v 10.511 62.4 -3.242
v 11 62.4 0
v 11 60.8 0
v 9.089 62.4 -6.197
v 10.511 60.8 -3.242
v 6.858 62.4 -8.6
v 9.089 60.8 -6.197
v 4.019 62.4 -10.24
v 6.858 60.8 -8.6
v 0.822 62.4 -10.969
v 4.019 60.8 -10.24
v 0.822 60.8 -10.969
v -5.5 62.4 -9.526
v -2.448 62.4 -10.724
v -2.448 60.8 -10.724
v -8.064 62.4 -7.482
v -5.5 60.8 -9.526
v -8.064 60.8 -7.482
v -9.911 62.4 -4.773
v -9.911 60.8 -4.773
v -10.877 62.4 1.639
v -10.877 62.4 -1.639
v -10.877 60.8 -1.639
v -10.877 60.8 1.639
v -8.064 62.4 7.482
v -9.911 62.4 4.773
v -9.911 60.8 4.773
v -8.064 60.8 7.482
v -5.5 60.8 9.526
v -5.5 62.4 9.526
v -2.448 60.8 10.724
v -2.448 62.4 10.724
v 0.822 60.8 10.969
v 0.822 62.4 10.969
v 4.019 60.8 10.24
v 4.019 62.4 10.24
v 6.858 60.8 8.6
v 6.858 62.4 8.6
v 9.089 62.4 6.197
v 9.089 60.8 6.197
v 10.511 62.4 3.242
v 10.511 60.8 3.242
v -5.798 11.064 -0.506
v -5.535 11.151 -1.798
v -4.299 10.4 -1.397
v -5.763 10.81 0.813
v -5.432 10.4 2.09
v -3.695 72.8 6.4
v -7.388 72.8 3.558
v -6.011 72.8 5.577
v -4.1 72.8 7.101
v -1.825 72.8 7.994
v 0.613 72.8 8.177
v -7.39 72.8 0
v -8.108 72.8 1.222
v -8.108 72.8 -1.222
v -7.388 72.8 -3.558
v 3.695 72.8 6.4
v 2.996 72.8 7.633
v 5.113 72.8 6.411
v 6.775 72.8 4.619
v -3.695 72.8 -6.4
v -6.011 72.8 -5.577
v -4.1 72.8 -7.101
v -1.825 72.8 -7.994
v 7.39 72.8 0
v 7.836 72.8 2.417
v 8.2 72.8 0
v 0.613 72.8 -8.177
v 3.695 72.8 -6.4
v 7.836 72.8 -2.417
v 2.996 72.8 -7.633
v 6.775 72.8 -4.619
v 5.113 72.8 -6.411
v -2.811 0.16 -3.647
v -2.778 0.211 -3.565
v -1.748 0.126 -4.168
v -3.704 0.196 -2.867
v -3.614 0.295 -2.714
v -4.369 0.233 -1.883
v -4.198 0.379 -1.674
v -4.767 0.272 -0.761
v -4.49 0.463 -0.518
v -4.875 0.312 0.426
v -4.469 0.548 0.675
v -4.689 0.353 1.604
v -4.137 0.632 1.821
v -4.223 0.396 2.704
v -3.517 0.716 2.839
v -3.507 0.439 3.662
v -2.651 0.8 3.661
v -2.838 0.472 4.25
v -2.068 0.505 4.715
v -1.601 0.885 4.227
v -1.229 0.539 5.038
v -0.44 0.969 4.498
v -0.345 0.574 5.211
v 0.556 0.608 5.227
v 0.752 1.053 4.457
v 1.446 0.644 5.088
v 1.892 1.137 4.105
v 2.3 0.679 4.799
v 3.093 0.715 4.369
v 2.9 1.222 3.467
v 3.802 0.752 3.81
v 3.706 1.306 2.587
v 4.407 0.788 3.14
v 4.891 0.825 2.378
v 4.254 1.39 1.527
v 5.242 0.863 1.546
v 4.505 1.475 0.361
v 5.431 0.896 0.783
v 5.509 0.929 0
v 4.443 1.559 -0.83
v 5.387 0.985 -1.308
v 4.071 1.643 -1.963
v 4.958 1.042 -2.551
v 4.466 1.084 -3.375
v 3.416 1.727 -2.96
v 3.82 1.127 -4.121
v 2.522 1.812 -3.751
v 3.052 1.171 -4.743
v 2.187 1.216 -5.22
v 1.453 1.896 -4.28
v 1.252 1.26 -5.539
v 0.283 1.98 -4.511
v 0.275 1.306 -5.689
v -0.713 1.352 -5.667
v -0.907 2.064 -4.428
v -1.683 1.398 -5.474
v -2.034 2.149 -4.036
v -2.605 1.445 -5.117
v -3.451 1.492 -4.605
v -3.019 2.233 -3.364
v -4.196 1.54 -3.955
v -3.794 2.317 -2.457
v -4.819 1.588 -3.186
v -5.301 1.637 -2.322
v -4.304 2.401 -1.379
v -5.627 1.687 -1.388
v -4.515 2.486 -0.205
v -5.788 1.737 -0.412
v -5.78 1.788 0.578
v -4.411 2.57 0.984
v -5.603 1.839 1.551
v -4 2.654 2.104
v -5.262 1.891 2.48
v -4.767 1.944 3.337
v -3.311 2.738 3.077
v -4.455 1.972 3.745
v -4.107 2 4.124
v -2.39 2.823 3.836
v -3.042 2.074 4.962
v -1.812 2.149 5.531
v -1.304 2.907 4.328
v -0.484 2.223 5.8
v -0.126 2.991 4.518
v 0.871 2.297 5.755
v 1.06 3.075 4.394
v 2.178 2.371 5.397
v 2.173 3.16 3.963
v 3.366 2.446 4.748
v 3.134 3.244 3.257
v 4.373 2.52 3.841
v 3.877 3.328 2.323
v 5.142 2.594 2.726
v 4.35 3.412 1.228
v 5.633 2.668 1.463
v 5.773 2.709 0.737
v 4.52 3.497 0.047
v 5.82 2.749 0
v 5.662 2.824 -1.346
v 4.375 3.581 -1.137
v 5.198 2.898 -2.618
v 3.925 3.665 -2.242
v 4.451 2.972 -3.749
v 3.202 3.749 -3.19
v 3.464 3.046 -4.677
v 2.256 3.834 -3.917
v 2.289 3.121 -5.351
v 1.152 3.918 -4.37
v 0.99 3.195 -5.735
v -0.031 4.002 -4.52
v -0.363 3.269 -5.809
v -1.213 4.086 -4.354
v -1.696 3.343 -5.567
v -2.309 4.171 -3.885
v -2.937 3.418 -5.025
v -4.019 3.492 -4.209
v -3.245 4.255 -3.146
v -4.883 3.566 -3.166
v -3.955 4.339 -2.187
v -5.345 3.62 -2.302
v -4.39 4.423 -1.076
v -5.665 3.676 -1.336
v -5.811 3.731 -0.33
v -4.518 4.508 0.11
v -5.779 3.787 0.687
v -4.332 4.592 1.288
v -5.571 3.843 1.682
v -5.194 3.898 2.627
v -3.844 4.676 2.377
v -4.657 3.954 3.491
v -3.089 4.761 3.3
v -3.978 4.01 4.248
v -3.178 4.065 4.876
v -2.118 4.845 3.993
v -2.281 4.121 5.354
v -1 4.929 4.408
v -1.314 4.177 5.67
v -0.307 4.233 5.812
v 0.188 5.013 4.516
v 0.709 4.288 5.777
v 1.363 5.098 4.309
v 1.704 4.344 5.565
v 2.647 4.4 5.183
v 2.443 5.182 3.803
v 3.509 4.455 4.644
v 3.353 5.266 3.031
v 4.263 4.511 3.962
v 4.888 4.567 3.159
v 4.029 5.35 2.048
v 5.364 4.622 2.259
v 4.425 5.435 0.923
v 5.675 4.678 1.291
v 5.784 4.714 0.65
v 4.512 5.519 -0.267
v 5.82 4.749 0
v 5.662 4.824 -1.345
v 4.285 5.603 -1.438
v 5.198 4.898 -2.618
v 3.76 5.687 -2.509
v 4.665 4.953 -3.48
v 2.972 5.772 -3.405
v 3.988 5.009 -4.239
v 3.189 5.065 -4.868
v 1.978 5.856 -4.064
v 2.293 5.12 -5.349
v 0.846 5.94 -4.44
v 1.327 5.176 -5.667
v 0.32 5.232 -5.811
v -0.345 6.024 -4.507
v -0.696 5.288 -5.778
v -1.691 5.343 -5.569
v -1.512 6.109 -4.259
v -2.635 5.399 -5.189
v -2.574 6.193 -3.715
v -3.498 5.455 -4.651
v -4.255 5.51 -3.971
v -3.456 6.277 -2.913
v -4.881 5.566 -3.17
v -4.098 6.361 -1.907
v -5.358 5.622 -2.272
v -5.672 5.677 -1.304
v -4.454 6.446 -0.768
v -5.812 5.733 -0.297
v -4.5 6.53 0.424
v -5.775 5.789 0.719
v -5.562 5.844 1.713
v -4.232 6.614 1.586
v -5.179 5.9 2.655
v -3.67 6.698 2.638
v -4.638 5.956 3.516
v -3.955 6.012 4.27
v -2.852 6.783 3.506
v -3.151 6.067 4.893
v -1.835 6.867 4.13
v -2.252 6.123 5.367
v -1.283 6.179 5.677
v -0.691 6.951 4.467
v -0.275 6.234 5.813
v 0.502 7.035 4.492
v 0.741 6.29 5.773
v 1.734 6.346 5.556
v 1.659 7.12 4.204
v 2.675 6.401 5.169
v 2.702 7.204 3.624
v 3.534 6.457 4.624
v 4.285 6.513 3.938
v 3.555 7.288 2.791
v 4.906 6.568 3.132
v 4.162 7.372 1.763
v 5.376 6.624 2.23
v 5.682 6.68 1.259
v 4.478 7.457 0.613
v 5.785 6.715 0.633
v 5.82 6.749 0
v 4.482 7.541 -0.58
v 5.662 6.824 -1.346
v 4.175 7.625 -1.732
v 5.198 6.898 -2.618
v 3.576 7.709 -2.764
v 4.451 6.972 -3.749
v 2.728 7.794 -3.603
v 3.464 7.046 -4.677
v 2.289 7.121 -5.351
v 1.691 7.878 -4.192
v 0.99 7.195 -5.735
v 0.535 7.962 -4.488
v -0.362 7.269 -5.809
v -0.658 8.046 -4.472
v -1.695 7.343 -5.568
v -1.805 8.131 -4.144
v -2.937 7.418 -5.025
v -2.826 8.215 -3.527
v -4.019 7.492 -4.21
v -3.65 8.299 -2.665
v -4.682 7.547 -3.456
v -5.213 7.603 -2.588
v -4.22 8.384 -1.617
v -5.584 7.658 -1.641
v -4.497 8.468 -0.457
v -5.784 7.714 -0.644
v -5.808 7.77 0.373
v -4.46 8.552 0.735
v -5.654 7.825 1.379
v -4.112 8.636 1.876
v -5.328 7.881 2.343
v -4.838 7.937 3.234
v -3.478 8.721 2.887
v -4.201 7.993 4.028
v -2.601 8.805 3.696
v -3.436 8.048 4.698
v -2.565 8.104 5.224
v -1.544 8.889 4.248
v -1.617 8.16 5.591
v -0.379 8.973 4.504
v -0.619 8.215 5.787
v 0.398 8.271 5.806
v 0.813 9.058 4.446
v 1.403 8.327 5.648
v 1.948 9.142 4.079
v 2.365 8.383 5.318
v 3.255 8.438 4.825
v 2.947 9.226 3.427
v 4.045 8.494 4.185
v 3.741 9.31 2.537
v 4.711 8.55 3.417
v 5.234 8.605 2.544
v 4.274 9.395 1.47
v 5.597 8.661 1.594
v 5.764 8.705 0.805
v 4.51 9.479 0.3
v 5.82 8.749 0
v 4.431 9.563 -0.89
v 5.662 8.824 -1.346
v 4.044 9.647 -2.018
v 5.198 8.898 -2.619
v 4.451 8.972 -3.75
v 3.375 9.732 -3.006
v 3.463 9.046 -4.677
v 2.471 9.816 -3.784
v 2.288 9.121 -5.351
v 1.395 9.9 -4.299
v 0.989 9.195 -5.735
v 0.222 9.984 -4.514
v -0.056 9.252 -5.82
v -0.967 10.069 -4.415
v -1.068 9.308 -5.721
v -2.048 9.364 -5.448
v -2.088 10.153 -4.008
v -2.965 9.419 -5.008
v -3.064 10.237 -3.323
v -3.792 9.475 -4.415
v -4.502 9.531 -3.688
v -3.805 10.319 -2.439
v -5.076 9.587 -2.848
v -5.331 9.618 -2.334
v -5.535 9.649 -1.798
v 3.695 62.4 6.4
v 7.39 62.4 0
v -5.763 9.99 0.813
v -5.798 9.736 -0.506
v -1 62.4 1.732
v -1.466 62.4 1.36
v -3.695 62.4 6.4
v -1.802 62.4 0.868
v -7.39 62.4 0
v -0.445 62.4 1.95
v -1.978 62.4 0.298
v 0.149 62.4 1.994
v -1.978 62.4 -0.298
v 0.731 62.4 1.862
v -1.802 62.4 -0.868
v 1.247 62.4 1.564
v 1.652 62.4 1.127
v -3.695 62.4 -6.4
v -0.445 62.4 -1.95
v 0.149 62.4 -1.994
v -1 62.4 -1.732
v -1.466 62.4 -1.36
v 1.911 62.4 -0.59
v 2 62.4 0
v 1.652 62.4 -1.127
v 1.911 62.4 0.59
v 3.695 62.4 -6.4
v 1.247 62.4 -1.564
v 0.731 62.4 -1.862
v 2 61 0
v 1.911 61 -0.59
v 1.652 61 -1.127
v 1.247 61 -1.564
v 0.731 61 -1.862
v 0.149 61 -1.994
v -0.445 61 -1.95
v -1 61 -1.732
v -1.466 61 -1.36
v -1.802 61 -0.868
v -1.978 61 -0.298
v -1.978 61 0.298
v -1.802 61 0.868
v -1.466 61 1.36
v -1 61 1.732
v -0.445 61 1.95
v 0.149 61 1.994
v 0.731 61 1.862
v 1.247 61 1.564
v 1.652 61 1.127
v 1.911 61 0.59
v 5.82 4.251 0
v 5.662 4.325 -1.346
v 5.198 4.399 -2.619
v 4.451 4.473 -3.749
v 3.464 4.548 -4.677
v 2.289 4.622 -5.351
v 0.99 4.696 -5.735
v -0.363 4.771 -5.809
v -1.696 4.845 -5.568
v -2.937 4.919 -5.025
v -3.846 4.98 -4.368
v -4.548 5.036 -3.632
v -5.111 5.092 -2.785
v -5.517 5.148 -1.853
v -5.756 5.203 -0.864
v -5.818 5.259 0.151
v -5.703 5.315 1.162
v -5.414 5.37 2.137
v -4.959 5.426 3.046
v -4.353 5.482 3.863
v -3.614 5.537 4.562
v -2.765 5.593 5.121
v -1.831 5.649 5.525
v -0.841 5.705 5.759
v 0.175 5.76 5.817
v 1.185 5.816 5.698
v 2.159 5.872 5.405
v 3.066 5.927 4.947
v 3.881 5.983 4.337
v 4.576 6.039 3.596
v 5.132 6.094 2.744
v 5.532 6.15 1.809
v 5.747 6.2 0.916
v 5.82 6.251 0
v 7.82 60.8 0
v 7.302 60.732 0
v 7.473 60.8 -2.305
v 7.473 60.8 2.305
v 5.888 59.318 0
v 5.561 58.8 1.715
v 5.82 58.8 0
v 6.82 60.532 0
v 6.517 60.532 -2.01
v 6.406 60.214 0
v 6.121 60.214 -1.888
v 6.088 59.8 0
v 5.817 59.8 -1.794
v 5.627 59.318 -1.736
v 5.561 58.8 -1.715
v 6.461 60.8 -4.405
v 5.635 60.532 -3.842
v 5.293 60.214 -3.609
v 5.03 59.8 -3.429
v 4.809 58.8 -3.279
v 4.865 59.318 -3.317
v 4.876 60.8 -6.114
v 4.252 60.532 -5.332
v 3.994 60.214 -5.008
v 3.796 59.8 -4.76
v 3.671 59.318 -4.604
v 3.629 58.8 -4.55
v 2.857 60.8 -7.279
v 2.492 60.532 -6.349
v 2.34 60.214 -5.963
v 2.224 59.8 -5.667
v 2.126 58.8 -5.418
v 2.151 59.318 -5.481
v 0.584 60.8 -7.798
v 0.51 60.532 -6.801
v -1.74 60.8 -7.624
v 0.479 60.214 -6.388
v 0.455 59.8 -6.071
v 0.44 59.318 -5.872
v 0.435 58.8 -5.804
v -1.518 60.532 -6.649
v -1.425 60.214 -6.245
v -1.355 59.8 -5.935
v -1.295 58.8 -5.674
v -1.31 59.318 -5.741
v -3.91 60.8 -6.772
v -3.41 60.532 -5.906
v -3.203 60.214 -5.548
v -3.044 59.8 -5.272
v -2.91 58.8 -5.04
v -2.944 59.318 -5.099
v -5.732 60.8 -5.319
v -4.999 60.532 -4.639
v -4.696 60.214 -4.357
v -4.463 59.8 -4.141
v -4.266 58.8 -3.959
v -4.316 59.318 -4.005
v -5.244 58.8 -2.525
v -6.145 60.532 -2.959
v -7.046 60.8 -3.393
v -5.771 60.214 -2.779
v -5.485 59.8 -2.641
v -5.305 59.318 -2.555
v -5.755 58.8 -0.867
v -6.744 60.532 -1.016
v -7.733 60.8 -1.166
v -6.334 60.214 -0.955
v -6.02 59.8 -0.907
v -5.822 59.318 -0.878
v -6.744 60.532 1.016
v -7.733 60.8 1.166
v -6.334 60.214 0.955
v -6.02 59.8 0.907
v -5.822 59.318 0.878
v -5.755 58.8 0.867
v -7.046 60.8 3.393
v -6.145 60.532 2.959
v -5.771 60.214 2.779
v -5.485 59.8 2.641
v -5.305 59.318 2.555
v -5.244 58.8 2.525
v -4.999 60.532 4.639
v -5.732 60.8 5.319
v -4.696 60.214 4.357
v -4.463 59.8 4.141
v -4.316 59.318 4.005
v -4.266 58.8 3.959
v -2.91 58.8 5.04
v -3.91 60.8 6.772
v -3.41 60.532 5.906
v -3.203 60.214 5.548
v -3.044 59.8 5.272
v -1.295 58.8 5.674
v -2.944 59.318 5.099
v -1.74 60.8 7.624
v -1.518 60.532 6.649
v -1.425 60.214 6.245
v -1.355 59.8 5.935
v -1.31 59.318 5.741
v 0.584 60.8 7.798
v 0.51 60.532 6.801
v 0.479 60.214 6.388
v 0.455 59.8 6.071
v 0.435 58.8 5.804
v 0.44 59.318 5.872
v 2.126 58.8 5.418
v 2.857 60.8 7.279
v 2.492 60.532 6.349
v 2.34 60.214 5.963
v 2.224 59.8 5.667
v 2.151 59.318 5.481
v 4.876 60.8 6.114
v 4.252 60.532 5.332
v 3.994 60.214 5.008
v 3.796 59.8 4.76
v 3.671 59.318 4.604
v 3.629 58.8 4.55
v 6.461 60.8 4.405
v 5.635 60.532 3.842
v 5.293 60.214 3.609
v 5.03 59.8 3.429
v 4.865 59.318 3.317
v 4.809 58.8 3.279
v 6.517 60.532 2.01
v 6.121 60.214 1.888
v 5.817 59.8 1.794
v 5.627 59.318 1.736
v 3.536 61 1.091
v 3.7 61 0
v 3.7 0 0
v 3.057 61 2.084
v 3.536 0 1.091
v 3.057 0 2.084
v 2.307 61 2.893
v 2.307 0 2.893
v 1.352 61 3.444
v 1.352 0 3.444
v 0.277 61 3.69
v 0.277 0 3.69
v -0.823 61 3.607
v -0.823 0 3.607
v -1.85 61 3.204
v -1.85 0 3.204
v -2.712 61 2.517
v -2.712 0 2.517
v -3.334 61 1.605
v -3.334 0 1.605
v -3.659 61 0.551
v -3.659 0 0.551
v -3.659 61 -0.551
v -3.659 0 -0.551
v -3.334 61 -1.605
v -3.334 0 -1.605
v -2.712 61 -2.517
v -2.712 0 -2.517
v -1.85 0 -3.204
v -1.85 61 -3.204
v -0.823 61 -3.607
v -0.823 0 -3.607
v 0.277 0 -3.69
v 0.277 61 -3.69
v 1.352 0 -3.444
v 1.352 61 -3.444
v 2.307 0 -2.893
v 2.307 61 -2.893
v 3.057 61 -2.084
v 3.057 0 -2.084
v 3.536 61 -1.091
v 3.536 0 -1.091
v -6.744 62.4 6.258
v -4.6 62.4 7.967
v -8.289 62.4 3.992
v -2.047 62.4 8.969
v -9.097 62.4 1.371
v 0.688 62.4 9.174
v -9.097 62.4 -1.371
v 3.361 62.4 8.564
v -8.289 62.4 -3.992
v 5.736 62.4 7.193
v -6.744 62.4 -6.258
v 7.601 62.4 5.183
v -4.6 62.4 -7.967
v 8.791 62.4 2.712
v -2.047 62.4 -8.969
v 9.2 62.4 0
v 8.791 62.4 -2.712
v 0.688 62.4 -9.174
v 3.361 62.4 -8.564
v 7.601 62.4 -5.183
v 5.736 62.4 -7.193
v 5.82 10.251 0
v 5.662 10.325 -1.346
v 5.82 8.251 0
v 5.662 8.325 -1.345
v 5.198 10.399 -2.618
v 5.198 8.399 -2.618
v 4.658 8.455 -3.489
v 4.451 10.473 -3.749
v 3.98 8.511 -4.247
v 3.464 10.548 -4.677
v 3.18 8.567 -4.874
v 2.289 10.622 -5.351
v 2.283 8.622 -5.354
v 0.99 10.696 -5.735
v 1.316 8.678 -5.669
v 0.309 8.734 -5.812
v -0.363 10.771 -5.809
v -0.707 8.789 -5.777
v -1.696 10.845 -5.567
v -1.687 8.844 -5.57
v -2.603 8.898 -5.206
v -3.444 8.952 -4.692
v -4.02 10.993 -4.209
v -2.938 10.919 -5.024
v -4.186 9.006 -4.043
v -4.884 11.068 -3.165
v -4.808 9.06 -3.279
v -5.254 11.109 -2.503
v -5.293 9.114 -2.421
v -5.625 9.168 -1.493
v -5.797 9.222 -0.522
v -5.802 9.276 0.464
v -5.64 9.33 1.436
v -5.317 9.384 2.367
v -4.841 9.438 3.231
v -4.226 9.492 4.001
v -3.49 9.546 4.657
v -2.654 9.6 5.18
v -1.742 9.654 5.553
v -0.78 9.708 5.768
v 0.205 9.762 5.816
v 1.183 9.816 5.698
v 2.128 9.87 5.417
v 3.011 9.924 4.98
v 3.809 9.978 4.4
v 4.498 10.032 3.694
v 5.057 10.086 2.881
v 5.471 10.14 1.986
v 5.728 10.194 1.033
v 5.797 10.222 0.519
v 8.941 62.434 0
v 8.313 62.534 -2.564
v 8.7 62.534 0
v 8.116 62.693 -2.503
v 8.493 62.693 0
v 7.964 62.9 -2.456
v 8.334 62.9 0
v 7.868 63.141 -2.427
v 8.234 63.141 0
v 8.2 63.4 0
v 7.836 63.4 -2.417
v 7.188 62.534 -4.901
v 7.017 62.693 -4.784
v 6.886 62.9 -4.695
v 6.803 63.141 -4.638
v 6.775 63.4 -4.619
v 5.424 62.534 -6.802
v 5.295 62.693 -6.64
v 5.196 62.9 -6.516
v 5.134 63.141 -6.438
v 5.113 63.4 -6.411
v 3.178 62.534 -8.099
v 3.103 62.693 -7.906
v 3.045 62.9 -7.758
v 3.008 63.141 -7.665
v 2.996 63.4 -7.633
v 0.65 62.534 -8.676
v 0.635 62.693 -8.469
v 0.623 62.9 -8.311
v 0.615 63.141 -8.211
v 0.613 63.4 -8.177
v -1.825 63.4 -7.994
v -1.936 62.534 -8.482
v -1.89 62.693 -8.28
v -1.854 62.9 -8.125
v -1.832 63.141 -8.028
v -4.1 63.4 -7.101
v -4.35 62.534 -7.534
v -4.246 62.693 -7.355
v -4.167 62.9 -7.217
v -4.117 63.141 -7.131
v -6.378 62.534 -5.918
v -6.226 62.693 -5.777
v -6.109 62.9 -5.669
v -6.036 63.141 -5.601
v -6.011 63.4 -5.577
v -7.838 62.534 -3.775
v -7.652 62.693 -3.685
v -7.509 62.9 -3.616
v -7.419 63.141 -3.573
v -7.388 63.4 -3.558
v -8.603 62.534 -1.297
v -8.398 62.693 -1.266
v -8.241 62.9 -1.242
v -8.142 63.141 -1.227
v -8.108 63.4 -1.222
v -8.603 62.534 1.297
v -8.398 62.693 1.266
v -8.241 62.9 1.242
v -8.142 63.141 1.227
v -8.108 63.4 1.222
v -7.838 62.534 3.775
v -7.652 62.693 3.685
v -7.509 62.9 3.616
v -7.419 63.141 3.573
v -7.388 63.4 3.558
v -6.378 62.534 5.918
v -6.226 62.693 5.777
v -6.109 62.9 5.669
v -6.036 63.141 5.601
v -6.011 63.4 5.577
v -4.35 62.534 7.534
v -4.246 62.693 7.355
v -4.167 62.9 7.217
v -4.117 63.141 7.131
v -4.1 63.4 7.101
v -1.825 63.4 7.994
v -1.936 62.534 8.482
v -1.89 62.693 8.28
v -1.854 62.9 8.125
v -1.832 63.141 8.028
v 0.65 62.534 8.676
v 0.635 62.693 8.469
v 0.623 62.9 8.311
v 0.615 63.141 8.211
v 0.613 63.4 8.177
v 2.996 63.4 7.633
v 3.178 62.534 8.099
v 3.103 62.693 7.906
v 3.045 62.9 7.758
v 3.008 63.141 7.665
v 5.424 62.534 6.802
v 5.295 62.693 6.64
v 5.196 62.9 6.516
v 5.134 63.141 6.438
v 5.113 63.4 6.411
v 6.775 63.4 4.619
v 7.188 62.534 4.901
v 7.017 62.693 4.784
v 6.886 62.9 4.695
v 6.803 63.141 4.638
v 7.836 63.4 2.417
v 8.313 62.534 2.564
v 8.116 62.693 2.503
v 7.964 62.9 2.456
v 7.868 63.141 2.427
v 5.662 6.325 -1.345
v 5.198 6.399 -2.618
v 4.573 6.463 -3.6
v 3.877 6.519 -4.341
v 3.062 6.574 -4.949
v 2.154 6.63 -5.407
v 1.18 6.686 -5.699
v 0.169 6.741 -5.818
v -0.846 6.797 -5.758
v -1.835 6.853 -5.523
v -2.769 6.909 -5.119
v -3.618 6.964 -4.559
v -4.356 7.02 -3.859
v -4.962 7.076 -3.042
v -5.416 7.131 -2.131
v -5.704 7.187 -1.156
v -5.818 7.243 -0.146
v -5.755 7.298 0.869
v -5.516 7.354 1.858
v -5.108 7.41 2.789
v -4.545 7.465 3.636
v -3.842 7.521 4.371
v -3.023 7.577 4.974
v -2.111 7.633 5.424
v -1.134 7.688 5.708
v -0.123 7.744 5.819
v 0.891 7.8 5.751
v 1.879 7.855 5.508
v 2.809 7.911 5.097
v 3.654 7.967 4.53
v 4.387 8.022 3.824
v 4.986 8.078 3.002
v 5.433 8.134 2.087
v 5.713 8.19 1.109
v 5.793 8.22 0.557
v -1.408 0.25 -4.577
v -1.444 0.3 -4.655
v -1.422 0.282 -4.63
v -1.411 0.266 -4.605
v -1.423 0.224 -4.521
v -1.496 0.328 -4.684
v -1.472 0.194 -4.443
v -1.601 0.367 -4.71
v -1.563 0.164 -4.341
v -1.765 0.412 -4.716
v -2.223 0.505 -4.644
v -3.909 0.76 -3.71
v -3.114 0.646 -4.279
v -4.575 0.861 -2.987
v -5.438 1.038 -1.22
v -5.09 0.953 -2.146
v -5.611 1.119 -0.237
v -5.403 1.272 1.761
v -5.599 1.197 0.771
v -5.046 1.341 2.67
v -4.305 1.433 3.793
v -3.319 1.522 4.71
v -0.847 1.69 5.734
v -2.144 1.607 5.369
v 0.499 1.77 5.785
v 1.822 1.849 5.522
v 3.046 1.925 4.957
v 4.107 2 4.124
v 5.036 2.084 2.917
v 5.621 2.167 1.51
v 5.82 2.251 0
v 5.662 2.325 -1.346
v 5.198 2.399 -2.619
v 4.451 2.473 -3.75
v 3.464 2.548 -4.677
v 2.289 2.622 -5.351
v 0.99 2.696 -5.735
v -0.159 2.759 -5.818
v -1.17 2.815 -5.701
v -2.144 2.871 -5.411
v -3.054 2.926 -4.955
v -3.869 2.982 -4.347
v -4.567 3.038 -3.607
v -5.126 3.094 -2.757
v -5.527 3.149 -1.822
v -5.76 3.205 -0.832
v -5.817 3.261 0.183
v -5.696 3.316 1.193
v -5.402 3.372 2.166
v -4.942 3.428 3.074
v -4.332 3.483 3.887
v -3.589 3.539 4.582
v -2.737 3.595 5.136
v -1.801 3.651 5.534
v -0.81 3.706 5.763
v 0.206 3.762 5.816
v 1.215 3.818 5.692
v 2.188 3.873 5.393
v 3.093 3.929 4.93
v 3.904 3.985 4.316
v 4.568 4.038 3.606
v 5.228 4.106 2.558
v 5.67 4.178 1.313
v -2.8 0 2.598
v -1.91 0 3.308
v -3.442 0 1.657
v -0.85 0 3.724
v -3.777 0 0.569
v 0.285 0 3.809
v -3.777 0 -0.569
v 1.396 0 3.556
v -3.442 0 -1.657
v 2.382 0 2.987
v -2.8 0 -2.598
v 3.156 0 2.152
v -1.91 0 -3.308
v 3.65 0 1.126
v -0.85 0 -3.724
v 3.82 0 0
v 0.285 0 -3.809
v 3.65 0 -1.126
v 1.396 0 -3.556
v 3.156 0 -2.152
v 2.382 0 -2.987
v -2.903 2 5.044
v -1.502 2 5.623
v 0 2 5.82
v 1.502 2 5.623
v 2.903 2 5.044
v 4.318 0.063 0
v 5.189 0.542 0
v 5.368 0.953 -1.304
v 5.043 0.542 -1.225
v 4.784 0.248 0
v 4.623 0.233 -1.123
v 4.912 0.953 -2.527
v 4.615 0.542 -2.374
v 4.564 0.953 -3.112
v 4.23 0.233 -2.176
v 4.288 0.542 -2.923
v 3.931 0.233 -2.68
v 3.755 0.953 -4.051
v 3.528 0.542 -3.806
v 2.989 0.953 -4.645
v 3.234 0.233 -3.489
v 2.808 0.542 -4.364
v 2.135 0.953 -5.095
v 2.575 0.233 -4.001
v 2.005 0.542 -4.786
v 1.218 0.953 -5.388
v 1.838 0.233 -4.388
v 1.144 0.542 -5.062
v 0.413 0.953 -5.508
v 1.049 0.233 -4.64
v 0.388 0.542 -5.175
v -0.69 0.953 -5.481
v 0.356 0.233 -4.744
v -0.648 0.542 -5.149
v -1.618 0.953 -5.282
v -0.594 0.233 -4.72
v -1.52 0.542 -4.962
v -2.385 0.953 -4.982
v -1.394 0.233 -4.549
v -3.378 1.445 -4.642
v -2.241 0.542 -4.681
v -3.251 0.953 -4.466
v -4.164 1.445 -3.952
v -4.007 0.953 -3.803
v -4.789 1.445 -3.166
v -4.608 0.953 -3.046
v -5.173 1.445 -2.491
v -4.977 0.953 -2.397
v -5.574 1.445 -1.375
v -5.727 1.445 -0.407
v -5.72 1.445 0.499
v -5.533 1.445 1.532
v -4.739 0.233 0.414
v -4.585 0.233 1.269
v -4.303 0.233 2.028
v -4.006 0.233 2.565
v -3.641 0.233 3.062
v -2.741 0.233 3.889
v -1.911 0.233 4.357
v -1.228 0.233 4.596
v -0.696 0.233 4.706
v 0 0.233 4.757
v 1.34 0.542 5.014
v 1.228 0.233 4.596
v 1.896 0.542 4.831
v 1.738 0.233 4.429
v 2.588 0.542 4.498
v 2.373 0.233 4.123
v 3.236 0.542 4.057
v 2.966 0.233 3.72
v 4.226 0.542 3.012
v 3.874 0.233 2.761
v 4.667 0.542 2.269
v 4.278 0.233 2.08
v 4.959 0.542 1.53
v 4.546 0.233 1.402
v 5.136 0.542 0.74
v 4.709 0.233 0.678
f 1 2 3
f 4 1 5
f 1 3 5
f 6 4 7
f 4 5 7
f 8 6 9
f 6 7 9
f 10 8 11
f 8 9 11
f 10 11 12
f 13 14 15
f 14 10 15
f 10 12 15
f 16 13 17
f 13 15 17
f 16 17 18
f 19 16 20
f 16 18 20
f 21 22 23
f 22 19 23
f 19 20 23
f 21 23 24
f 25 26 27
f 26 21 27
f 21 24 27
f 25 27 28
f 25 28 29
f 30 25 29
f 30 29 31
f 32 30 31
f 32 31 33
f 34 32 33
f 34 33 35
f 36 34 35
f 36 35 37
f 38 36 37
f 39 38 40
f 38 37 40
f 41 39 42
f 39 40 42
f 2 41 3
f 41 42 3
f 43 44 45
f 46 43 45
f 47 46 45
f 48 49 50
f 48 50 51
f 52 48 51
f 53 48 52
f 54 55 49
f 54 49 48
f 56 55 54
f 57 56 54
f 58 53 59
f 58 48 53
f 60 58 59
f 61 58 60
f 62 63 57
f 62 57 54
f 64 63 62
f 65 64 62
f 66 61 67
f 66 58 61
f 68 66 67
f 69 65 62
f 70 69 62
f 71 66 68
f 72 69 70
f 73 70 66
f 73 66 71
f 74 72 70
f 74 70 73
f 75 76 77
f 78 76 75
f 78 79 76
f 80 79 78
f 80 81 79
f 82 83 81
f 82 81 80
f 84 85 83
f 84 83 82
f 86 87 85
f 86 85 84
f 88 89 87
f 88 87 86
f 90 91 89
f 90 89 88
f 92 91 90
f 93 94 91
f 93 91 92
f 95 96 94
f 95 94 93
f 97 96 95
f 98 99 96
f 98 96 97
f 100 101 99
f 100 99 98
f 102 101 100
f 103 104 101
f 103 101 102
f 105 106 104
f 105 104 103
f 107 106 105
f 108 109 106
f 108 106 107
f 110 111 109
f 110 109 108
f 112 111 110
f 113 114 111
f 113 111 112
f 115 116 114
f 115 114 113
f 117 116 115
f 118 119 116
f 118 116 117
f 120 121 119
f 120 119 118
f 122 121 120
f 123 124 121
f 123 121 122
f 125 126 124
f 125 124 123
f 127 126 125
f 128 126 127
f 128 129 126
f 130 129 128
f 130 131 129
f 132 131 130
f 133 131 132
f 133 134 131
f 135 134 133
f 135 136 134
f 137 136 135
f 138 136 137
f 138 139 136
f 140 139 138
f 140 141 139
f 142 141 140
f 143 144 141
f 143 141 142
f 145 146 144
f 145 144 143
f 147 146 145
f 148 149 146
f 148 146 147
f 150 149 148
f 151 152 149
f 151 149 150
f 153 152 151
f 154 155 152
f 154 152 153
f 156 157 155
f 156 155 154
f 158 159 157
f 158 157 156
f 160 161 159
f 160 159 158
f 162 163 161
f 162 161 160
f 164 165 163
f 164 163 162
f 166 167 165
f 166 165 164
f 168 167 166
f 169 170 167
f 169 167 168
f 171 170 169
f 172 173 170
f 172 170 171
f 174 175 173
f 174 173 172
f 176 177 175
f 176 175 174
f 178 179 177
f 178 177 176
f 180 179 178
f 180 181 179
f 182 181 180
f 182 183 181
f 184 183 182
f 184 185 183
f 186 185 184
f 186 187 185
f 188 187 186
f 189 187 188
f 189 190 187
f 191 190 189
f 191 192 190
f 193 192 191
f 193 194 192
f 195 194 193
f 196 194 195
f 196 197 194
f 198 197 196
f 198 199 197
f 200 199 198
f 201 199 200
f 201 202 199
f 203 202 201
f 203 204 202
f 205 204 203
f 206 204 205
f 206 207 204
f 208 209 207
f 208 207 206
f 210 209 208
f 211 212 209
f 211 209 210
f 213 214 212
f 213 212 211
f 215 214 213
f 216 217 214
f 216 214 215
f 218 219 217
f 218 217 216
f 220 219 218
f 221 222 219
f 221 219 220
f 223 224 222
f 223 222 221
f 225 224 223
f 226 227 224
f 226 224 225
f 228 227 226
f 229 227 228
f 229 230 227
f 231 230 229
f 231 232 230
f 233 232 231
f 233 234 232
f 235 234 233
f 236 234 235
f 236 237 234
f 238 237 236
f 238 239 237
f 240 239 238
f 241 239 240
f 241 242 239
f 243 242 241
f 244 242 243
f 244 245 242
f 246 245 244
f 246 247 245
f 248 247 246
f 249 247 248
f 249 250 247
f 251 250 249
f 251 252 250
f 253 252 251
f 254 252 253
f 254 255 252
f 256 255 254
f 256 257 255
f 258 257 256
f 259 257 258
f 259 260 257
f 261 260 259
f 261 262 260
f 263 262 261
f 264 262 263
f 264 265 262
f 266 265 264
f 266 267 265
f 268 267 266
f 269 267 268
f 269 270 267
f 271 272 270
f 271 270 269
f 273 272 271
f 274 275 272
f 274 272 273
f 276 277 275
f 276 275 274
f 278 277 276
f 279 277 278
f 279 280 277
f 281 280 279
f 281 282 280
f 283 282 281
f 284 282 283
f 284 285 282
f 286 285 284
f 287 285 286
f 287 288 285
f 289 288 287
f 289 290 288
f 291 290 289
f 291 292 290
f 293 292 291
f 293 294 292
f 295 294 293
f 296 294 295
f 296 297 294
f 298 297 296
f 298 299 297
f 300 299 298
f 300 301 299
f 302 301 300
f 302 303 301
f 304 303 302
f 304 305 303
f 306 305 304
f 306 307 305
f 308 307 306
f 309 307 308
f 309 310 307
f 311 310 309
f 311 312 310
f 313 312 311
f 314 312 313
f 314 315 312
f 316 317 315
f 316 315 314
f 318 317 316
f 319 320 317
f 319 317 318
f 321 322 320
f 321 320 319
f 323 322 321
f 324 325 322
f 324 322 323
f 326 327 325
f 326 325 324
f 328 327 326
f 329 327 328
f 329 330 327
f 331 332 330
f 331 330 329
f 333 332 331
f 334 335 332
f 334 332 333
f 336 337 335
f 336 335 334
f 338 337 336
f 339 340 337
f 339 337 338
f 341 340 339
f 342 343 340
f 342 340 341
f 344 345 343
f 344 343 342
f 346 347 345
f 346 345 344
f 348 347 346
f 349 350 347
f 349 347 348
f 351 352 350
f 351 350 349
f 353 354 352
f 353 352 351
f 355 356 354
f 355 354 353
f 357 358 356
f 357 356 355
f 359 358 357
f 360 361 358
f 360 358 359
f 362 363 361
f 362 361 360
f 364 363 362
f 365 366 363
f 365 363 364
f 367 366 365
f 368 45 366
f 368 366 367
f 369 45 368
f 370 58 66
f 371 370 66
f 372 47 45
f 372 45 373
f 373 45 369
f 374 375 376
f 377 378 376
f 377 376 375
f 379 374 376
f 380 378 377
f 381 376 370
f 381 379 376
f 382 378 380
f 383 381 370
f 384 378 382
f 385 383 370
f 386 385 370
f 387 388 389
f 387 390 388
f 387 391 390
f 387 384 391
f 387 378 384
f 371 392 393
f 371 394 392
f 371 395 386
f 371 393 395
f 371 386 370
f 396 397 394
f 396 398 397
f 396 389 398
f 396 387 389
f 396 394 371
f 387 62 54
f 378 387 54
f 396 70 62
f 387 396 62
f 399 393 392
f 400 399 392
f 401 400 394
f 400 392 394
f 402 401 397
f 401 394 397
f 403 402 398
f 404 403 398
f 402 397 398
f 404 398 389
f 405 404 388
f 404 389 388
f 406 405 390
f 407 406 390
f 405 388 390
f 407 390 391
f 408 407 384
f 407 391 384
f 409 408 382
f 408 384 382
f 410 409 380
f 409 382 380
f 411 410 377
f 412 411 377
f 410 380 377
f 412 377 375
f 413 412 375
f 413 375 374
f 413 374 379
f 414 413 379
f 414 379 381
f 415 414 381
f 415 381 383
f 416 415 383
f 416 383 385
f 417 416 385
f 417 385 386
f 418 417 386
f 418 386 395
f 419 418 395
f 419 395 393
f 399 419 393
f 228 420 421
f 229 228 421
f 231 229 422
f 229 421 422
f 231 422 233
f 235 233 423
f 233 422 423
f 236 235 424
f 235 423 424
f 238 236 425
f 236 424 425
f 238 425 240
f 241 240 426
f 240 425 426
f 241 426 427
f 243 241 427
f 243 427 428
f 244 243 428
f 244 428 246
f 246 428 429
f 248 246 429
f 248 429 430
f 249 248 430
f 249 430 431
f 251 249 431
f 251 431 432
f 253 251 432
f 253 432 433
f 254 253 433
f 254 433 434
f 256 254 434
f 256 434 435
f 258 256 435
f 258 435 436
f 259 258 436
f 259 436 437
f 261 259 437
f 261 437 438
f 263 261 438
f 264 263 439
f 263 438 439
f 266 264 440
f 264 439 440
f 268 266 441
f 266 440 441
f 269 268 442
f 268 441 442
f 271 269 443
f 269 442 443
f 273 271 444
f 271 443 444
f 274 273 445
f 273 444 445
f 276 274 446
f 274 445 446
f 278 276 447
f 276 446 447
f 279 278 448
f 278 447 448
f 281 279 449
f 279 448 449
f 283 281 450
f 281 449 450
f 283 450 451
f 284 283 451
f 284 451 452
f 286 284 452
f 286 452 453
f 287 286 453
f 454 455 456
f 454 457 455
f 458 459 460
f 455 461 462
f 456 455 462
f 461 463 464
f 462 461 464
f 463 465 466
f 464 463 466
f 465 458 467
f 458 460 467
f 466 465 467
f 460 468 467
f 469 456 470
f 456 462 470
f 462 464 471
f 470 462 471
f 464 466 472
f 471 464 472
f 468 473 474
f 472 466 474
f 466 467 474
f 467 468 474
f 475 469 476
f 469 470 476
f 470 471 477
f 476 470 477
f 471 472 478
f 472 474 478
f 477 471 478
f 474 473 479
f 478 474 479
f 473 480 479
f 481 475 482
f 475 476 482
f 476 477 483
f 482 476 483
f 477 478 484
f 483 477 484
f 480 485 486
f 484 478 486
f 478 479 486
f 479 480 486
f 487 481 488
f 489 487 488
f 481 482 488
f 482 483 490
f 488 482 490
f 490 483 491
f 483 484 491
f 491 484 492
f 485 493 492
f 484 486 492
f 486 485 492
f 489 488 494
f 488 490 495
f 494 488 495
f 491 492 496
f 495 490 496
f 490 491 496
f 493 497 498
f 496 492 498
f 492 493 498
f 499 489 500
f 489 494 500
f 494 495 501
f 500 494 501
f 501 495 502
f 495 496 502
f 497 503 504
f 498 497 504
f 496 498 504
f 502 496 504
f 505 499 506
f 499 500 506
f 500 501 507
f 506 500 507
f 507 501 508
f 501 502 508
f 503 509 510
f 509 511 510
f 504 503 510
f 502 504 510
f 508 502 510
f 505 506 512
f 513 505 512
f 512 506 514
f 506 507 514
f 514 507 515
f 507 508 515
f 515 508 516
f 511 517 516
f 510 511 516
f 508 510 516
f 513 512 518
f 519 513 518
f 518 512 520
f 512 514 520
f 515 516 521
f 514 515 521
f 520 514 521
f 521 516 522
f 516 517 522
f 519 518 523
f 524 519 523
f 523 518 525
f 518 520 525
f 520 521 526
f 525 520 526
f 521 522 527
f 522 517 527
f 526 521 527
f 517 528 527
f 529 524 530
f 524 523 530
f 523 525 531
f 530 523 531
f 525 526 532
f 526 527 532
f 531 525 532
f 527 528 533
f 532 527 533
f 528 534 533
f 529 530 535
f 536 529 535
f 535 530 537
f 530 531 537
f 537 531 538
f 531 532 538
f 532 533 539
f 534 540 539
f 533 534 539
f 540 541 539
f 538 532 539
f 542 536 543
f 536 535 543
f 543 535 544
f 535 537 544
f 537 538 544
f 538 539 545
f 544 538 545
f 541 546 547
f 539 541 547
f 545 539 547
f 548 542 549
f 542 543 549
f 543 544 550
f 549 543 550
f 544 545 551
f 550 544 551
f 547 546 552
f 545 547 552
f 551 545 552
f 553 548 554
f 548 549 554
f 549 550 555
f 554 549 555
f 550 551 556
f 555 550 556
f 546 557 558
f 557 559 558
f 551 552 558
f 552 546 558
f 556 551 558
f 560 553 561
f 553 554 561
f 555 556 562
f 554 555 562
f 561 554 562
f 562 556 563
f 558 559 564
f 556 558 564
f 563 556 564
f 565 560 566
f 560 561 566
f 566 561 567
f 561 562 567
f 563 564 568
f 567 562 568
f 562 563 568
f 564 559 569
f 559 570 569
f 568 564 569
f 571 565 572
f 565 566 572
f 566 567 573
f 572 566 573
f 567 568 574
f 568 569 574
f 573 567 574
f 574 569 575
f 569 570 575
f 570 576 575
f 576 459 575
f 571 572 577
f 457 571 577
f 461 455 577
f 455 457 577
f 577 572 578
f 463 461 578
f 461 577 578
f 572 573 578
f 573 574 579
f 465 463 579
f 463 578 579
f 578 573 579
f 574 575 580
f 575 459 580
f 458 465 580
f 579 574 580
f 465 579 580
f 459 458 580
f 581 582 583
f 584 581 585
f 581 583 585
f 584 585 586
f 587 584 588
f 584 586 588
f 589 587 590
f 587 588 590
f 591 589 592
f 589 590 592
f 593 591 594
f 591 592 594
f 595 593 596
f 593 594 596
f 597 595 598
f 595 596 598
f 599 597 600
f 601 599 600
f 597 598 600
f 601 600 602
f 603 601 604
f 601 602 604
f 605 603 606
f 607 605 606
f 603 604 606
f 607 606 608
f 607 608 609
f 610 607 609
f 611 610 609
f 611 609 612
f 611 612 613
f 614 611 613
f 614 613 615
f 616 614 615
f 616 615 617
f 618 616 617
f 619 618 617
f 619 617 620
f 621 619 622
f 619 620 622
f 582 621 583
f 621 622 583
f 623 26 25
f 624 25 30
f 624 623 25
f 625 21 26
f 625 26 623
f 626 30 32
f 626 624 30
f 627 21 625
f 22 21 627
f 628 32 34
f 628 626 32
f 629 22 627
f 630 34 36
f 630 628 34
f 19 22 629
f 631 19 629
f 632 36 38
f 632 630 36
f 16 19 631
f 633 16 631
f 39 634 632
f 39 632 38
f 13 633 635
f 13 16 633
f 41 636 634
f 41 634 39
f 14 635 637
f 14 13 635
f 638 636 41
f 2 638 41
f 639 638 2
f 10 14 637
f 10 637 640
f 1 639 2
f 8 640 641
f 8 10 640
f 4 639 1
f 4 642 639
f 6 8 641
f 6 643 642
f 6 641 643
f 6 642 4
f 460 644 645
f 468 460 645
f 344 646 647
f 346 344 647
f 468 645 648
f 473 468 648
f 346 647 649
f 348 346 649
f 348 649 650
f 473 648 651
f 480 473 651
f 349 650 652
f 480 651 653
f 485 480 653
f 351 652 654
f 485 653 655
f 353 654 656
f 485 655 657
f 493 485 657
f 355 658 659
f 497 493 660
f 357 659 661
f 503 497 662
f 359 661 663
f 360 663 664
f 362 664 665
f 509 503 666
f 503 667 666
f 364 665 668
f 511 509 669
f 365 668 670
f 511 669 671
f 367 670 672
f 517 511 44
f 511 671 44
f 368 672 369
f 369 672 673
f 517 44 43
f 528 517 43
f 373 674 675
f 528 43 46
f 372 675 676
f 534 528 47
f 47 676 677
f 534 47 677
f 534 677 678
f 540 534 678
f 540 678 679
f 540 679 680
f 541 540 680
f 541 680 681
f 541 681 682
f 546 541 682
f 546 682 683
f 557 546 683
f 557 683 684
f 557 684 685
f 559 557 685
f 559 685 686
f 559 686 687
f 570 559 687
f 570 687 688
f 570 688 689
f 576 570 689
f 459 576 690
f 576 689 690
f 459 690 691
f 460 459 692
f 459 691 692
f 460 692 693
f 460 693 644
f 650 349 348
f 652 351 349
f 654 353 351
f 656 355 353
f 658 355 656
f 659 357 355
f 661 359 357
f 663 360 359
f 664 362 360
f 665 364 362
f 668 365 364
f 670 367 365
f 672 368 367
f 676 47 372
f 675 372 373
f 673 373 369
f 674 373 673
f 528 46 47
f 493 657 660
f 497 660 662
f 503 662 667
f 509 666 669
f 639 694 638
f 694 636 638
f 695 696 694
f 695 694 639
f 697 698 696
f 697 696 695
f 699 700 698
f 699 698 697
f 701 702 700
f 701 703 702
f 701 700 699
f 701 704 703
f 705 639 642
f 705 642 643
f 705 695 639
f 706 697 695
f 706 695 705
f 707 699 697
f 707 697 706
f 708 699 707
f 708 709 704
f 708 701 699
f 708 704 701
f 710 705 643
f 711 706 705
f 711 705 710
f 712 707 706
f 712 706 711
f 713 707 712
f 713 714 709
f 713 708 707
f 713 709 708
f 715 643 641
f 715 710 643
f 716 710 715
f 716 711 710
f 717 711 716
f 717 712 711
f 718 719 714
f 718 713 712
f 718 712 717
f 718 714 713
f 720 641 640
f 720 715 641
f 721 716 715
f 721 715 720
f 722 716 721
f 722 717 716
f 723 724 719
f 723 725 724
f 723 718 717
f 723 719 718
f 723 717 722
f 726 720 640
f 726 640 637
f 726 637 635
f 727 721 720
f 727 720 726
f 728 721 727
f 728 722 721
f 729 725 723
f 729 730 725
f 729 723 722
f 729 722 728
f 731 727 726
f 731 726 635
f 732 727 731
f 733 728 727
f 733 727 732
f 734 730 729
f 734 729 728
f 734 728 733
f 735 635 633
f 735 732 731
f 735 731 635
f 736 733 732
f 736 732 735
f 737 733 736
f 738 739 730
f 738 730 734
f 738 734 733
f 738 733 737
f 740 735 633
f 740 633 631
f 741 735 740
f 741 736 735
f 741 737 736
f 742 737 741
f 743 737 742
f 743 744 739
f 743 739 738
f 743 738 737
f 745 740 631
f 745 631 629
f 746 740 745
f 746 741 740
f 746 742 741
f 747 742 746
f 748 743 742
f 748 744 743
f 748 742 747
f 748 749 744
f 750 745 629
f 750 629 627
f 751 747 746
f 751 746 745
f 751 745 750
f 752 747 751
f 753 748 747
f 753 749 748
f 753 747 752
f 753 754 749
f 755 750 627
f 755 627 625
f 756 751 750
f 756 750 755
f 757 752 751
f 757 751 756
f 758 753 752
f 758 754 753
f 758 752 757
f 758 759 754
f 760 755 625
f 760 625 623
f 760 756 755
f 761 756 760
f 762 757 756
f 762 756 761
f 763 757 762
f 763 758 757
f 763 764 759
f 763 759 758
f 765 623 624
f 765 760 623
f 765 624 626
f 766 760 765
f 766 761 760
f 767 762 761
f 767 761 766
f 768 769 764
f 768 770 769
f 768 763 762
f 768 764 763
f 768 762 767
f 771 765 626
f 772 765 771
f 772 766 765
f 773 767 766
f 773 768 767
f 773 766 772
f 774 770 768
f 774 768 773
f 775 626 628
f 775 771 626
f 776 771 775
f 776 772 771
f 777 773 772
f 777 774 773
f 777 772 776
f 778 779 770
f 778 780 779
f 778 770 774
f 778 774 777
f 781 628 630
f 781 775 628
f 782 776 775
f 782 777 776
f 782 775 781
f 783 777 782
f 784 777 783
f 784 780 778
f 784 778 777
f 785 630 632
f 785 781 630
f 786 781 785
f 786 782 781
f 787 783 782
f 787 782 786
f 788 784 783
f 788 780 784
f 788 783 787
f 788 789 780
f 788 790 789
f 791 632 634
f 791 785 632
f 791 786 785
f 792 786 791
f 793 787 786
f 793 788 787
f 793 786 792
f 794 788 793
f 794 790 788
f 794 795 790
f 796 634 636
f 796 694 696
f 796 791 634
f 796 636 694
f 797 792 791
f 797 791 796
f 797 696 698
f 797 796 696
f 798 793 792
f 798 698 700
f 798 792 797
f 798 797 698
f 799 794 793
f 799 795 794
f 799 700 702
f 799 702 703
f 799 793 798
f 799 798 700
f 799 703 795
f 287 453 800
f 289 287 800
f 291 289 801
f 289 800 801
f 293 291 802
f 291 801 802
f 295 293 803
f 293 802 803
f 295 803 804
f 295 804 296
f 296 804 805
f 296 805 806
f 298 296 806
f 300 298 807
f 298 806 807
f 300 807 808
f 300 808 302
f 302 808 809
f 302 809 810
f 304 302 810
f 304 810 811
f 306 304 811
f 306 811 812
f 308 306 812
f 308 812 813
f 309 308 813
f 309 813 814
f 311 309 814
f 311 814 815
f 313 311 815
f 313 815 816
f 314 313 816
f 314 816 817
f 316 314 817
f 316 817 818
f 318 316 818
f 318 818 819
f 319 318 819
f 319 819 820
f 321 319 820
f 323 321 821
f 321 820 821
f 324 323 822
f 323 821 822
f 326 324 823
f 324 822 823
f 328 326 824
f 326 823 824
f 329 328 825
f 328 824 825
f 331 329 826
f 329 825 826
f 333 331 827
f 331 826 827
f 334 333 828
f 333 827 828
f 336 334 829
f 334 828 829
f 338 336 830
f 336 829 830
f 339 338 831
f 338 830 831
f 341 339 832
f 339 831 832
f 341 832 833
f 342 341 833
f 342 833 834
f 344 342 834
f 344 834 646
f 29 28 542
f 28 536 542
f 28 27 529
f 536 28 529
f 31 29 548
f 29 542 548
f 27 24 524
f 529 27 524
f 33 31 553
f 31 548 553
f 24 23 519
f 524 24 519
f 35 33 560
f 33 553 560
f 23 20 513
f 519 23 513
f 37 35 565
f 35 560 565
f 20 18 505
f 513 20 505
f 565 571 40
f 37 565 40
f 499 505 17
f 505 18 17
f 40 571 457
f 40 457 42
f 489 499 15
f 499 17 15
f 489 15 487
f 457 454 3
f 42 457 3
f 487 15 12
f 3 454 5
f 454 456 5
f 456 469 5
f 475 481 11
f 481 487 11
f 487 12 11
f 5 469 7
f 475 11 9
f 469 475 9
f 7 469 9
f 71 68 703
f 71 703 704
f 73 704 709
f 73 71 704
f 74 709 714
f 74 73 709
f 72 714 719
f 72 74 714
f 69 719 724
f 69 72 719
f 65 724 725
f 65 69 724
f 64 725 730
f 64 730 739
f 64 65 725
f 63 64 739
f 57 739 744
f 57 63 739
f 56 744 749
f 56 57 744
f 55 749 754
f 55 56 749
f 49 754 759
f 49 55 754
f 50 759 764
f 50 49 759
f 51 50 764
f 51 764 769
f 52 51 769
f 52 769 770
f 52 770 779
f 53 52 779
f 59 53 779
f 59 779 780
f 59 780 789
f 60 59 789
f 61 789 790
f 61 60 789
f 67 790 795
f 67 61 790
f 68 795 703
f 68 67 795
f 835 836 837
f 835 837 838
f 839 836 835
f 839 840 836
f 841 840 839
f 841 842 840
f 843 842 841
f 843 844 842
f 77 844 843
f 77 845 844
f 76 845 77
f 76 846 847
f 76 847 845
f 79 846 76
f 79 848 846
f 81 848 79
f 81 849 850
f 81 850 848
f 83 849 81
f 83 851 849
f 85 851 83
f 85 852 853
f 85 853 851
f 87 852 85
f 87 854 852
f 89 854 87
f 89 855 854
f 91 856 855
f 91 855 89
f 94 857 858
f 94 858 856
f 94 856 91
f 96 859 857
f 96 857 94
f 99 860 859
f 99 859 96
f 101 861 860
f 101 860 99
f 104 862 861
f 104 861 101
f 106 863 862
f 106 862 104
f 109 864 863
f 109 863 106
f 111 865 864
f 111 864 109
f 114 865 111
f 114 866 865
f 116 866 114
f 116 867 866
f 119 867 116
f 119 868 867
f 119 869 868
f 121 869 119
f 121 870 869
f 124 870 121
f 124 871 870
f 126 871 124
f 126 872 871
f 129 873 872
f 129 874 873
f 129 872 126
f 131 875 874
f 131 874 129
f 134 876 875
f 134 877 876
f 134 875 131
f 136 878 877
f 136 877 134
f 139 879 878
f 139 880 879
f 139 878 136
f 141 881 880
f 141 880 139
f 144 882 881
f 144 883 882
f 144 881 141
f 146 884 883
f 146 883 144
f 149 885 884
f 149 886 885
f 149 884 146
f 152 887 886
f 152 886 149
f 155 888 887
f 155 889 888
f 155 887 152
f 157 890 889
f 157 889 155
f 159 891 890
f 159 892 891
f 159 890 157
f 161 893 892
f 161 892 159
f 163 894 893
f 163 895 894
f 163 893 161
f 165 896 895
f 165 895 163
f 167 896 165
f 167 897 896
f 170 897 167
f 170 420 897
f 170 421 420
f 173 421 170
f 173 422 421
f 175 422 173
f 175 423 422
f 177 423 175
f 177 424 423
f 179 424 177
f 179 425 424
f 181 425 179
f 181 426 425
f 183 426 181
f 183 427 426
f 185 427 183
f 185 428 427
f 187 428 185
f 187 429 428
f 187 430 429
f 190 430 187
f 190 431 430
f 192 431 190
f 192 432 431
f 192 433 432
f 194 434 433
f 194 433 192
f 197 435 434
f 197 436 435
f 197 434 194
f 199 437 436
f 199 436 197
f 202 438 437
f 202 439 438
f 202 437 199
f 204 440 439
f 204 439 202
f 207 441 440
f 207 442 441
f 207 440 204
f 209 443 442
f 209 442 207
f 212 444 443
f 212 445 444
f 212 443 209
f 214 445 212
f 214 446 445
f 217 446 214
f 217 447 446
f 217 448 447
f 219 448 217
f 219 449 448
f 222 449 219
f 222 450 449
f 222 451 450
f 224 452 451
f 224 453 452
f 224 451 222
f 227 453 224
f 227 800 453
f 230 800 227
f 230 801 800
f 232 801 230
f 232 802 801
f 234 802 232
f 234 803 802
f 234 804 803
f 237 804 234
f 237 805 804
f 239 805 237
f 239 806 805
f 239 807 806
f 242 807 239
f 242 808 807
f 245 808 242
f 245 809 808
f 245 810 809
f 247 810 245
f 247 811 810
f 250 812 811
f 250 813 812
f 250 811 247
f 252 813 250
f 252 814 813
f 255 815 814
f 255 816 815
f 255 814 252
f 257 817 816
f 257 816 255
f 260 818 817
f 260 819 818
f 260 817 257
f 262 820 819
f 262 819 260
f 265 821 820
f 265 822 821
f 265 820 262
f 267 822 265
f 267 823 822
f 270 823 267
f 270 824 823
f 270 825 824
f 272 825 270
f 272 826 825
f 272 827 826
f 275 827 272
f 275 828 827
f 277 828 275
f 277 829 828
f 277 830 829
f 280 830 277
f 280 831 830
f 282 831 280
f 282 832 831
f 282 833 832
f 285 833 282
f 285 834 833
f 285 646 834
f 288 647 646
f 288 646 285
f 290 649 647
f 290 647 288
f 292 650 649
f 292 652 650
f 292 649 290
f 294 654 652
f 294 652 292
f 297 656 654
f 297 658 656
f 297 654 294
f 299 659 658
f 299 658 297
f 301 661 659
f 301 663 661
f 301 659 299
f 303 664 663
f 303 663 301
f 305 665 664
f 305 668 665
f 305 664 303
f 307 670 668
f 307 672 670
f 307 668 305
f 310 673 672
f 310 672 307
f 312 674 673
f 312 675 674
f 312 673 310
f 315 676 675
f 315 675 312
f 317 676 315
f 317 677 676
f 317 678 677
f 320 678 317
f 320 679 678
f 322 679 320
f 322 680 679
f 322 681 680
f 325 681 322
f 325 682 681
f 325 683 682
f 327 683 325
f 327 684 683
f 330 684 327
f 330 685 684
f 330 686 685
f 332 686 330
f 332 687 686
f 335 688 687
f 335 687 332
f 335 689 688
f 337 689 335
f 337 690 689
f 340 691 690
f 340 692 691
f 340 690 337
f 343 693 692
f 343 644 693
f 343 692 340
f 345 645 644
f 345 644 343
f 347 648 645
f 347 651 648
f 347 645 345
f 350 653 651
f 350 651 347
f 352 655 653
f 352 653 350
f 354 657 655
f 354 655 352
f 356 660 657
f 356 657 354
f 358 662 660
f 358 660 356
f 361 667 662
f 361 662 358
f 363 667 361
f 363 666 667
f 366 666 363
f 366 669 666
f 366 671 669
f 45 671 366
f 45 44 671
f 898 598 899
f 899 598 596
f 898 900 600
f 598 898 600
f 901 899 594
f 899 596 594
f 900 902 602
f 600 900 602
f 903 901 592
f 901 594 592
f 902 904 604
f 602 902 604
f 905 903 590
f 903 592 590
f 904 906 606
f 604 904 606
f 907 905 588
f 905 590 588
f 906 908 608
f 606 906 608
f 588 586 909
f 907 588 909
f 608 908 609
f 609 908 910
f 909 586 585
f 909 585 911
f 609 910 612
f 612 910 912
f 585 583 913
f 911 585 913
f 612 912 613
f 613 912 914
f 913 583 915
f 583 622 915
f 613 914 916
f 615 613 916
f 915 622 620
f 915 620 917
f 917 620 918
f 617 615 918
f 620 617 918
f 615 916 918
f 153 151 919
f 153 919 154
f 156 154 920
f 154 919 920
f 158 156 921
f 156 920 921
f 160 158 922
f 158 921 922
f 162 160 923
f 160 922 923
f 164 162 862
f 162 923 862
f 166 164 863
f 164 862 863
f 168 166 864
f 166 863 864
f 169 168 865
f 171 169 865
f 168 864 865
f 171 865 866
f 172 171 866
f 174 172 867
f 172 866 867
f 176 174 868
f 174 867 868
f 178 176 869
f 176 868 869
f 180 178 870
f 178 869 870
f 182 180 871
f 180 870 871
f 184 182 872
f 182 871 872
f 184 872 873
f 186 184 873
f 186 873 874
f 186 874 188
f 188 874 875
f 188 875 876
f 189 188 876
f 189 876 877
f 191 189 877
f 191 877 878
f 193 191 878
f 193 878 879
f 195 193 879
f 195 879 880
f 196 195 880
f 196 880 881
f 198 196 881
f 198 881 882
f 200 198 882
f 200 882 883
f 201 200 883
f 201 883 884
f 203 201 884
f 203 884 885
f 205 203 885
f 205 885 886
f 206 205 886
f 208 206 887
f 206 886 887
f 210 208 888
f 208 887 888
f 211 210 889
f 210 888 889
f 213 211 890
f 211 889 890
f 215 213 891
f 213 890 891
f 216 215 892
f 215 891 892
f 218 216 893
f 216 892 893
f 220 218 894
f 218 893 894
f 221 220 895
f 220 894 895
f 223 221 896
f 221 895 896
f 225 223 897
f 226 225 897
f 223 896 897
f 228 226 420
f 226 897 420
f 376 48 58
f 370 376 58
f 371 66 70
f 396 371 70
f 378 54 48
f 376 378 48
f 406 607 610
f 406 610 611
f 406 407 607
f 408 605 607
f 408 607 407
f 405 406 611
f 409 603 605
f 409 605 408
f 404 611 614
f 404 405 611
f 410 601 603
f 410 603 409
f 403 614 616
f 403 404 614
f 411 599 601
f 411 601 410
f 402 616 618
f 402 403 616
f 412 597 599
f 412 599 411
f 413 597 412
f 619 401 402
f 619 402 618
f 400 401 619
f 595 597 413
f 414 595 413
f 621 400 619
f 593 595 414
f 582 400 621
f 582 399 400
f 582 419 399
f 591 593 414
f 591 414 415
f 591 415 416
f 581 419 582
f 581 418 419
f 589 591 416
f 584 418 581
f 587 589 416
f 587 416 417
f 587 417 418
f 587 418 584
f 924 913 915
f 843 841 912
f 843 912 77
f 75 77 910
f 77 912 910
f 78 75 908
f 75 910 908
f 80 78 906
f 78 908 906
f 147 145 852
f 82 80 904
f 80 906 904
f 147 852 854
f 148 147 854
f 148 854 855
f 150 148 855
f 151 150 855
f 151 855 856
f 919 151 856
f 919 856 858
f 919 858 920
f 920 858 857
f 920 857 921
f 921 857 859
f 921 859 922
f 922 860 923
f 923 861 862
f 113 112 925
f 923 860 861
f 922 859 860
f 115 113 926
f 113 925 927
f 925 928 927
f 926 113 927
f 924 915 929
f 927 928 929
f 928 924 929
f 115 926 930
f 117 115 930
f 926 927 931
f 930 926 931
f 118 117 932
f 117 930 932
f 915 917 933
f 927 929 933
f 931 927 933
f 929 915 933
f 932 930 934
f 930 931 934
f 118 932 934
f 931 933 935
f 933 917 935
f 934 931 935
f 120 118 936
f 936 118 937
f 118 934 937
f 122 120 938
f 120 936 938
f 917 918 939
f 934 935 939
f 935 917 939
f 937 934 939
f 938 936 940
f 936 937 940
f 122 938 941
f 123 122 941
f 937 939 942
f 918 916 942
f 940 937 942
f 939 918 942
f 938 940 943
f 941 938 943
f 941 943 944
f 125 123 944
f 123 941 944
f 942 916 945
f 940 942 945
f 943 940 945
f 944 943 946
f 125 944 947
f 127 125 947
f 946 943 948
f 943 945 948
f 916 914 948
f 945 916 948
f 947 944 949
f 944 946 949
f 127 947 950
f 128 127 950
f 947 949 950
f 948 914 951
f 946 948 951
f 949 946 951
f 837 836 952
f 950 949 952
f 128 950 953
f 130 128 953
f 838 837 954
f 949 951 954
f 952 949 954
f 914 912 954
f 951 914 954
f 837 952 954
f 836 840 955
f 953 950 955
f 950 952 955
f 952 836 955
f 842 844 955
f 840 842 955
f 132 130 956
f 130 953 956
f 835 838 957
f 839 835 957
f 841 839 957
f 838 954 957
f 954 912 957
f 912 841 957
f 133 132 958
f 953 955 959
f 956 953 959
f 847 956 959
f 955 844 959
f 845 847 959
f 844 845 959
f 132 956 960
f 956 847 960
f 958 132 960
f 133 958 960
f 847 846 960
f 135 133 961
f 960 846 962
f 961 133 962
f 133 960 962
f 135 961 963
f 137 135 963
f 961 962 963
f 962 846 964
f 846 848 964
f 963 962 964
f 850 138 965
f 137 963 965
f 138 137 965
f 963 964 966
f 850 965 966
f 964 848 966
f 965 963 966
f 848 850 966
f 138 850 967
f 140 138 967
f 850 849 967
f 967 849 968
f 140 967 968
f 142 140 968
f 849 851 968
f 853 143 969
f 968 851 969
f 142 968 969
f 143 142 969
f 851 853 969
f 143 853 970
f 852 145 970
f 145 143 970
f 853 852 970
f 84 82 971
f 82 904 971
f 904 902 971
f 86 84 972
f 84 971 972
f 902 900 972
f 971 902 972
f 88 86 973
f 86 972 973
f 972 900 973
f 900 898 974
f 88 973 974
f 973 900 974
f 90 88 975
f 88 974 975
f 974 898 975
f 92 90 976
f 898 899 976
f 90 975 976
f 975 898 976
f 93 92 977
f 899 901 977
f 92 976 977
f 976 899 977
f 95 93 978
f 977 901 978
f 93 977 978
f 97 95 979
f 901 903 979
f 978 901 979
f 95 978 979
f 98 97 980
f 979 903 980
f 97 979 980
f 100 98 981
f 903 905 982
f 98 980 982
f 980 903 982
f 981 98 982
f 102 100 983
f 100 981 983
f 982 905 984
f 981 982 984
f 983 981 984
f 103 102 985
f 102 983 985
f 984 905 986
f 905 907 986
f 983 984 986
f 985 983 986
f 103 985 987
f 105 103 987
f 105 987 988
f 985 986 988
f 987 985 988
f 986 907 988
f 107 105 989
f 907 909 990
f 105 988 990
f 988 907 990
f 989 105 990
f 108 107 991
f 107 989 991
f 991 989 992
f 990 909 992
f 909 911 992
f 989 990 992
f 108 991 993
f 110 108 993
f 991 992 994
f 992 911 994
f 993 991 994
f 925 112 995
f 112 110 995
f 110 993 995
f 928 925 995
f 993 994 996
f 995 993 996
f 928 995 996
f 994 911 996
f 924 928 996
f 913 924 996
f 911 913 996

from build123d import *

# Parameters (mm, degrees)
ESBO_O1_R                       = 5.82
RESSALTO_EXTRUS_O1_DEPTH        = 60.8
ESBO_O2_R                       = 11
RESSALTO_EXTRUS_O2_DEPTH        = 12
FILETE1_R                       = 2
CORTE_EXTRUS_O1_DEPTH           = 10.4
ESBO_O4_R                       = 3.7
CORTE_EXTRUS_O2_DEPTH           = 61
ESBO_O5_R                       = 2
CORTE_EXTRUS_O3_DEPTH           = 2
FILETE2_R                       = 2
VARREDURA_DE_CORTE1_PITCH       = 2
VARREDURA_DE_CORTE1_HEIGHT      = 10.4
VARREDURA_DE_CORTE1_RADIUS      = 5.82
VARREDURA_DE_CORTE1_START_ANGLE = -180
ESBO_O10_OUTSIDE_W              = 39.834
ESBO_O10_OUTSIDE_H              = 39.834
ESBO_O10_OUTSIDE_R              = 8.2
CORTE_EXTRUS_O4_DEPTH           = 10.4
FILETE3_R                       = 1
CORTE_EXTRUS_O6_DEPTH           = 10


with BuildPart() as part:
    # Esboço1 → Ressalto-extrusão1 (new body)
    with BuildSketch(Plane(origin=(0, 0, 0), x_dir=(1, 0, 0), z_dir=(0, 1, 0))):
        Circle(ESBO_O1_R)
    extrude(amount=RESSALTO_EXTRUS_O1_DEPTH)

    # Esboço2 → Ressalto-extrusão2 (add)
    with BuildSketch(Plane(origin=(0, 60.8, 0), x_dir=(1, 0, 0), z_dir=(0, 1, 0))):
        Circle(ESBO_O2_R)
    extrude(amount=RESSALTO_EXTRUS_O2_DEPTH)

    # Filete1
    filete1_edges = [part.edges().sort_by_distance(p)[0] for p in [
        (-5.82, 60.8, 0),
    ]]
    fillet(filete1_edges, radius=FILETE1_R)

    # Esboço3 → Corte-extrusão1 (cut)
    with BuildSketch(Plane(origin=(0, 72.8, 0), x_dir=(1, 0, 0), z_dir=(0, 1, 0))):
        Polygon((-7.390083446, 0), (-3.695041723, -6.4), (3.695041723, -6.4), (7.390083446, 0), (3.695041723, 6.4), (-3.695041723, 6.4), align=None)
    extrude(amount=-CORTE_EXTRUS_O1_DEPTH, mode=Mode.SUBTRACT)

    # Esboço4 → Corte-extrusão2 (cut)
    with BuildSketch(Plane.XZ):
        Circle(ESBO_O4_R)
    extrude(amount=-CORTE_EXTRUS_O2_DEPTH, mode=Mode.SUBTRACT)

    # Esboço5 → Corte-extrusão3 (cut)
    with BuildSketch(Plane(origin=(0, 62.4, 0), x_dir=(1, 0, 0), z_dir=(0, 1, 0))):
        Circle(ESBO_O5_R)
    extrude(amount=-CORTE_EXTRUS_O3_DEPTH, mode=Mode.SUBTRACT)

    # Filete2
    filete2_edges = [part.edges().sort_by_distance(p)[0] for p in [
        (-5.82, 0, 0),
    ]]
    fillet(filete2_edges, radius=FILETE2_R)

    # Varredura de corte1: sweep along a helix
    with BuildLine() as varredura_de_corte1_path:
        add(Helix(VARREDURA_DE_CORTE1_PITCH, VARREDURA_DE_CORTE1_HEIGHT, VARREDURA_DE_CORTE1_RADIUS, center=(0, 0, 0), direction=(0, 1, 0), mode=Mode.PRIVATE).rotate(Axis((0, 0, 0), (0, 1, 0)), VARREDURA_DE_CORTE1_START_ANGLE))
    # Esboço9 → Varredura de corte1 (sweep, cut)
    with BuildSketch(Plane(origin=(0, 0, 0), x_dir=(0, 0, -1), z_dir=(1, 0, 0))):
        Polygon((4.5198, 0), (6.4698, -1.125833025), (6.4698, 1.125833025), align=None)
    sweep(path=varredura_de_corte1_path.line, is_frenet=True, mode=Mode.SUBTRACT)

    # Esboço10 outside → Corte-extrusão4 (cut)
    with BuildSketch(Plane(origin=(0, 72.8, 0), x_dir=(1, 0, 0), z_dir=(0, 1, 0))):
        Rectangle(ESBO_O10_OUTSIDE_W, ESBO_O10_OUTSIDE_H)
        Circle(ESBO_O10_OUTSIDE_R, mode=Mode.SUBTRACT)
    extrude(amount=-CORTE_EXTRUS_O4_DEPTH, mode=Mode.SUBTRACT)

    # Filete3
    filete3_edges = [part.edges().sort_by_distance(p)[0] for p in [
        (-8.2, 62.4, 0),
    ]]
    fillet(filete3_edges, radius=FILETE3_R)

    # Esboço12 → Corte-extrusão6 (cut)
    with BuildSketch(Plane(origin=(0, 0, 0), x_dir=(-0.951056516, 0, -0.309016994), z_dir=(0.309016994, 0, -0.951056516))):
        Polygon((5.82, 9.64932918), (5.82, 11.15067082), (4.5198, 10.4), align=None)
    extrude(amount=-CORTE_EXTRUS_O6_DEPTH, mode=Mode.SUBTRACT)


solid = part.part
